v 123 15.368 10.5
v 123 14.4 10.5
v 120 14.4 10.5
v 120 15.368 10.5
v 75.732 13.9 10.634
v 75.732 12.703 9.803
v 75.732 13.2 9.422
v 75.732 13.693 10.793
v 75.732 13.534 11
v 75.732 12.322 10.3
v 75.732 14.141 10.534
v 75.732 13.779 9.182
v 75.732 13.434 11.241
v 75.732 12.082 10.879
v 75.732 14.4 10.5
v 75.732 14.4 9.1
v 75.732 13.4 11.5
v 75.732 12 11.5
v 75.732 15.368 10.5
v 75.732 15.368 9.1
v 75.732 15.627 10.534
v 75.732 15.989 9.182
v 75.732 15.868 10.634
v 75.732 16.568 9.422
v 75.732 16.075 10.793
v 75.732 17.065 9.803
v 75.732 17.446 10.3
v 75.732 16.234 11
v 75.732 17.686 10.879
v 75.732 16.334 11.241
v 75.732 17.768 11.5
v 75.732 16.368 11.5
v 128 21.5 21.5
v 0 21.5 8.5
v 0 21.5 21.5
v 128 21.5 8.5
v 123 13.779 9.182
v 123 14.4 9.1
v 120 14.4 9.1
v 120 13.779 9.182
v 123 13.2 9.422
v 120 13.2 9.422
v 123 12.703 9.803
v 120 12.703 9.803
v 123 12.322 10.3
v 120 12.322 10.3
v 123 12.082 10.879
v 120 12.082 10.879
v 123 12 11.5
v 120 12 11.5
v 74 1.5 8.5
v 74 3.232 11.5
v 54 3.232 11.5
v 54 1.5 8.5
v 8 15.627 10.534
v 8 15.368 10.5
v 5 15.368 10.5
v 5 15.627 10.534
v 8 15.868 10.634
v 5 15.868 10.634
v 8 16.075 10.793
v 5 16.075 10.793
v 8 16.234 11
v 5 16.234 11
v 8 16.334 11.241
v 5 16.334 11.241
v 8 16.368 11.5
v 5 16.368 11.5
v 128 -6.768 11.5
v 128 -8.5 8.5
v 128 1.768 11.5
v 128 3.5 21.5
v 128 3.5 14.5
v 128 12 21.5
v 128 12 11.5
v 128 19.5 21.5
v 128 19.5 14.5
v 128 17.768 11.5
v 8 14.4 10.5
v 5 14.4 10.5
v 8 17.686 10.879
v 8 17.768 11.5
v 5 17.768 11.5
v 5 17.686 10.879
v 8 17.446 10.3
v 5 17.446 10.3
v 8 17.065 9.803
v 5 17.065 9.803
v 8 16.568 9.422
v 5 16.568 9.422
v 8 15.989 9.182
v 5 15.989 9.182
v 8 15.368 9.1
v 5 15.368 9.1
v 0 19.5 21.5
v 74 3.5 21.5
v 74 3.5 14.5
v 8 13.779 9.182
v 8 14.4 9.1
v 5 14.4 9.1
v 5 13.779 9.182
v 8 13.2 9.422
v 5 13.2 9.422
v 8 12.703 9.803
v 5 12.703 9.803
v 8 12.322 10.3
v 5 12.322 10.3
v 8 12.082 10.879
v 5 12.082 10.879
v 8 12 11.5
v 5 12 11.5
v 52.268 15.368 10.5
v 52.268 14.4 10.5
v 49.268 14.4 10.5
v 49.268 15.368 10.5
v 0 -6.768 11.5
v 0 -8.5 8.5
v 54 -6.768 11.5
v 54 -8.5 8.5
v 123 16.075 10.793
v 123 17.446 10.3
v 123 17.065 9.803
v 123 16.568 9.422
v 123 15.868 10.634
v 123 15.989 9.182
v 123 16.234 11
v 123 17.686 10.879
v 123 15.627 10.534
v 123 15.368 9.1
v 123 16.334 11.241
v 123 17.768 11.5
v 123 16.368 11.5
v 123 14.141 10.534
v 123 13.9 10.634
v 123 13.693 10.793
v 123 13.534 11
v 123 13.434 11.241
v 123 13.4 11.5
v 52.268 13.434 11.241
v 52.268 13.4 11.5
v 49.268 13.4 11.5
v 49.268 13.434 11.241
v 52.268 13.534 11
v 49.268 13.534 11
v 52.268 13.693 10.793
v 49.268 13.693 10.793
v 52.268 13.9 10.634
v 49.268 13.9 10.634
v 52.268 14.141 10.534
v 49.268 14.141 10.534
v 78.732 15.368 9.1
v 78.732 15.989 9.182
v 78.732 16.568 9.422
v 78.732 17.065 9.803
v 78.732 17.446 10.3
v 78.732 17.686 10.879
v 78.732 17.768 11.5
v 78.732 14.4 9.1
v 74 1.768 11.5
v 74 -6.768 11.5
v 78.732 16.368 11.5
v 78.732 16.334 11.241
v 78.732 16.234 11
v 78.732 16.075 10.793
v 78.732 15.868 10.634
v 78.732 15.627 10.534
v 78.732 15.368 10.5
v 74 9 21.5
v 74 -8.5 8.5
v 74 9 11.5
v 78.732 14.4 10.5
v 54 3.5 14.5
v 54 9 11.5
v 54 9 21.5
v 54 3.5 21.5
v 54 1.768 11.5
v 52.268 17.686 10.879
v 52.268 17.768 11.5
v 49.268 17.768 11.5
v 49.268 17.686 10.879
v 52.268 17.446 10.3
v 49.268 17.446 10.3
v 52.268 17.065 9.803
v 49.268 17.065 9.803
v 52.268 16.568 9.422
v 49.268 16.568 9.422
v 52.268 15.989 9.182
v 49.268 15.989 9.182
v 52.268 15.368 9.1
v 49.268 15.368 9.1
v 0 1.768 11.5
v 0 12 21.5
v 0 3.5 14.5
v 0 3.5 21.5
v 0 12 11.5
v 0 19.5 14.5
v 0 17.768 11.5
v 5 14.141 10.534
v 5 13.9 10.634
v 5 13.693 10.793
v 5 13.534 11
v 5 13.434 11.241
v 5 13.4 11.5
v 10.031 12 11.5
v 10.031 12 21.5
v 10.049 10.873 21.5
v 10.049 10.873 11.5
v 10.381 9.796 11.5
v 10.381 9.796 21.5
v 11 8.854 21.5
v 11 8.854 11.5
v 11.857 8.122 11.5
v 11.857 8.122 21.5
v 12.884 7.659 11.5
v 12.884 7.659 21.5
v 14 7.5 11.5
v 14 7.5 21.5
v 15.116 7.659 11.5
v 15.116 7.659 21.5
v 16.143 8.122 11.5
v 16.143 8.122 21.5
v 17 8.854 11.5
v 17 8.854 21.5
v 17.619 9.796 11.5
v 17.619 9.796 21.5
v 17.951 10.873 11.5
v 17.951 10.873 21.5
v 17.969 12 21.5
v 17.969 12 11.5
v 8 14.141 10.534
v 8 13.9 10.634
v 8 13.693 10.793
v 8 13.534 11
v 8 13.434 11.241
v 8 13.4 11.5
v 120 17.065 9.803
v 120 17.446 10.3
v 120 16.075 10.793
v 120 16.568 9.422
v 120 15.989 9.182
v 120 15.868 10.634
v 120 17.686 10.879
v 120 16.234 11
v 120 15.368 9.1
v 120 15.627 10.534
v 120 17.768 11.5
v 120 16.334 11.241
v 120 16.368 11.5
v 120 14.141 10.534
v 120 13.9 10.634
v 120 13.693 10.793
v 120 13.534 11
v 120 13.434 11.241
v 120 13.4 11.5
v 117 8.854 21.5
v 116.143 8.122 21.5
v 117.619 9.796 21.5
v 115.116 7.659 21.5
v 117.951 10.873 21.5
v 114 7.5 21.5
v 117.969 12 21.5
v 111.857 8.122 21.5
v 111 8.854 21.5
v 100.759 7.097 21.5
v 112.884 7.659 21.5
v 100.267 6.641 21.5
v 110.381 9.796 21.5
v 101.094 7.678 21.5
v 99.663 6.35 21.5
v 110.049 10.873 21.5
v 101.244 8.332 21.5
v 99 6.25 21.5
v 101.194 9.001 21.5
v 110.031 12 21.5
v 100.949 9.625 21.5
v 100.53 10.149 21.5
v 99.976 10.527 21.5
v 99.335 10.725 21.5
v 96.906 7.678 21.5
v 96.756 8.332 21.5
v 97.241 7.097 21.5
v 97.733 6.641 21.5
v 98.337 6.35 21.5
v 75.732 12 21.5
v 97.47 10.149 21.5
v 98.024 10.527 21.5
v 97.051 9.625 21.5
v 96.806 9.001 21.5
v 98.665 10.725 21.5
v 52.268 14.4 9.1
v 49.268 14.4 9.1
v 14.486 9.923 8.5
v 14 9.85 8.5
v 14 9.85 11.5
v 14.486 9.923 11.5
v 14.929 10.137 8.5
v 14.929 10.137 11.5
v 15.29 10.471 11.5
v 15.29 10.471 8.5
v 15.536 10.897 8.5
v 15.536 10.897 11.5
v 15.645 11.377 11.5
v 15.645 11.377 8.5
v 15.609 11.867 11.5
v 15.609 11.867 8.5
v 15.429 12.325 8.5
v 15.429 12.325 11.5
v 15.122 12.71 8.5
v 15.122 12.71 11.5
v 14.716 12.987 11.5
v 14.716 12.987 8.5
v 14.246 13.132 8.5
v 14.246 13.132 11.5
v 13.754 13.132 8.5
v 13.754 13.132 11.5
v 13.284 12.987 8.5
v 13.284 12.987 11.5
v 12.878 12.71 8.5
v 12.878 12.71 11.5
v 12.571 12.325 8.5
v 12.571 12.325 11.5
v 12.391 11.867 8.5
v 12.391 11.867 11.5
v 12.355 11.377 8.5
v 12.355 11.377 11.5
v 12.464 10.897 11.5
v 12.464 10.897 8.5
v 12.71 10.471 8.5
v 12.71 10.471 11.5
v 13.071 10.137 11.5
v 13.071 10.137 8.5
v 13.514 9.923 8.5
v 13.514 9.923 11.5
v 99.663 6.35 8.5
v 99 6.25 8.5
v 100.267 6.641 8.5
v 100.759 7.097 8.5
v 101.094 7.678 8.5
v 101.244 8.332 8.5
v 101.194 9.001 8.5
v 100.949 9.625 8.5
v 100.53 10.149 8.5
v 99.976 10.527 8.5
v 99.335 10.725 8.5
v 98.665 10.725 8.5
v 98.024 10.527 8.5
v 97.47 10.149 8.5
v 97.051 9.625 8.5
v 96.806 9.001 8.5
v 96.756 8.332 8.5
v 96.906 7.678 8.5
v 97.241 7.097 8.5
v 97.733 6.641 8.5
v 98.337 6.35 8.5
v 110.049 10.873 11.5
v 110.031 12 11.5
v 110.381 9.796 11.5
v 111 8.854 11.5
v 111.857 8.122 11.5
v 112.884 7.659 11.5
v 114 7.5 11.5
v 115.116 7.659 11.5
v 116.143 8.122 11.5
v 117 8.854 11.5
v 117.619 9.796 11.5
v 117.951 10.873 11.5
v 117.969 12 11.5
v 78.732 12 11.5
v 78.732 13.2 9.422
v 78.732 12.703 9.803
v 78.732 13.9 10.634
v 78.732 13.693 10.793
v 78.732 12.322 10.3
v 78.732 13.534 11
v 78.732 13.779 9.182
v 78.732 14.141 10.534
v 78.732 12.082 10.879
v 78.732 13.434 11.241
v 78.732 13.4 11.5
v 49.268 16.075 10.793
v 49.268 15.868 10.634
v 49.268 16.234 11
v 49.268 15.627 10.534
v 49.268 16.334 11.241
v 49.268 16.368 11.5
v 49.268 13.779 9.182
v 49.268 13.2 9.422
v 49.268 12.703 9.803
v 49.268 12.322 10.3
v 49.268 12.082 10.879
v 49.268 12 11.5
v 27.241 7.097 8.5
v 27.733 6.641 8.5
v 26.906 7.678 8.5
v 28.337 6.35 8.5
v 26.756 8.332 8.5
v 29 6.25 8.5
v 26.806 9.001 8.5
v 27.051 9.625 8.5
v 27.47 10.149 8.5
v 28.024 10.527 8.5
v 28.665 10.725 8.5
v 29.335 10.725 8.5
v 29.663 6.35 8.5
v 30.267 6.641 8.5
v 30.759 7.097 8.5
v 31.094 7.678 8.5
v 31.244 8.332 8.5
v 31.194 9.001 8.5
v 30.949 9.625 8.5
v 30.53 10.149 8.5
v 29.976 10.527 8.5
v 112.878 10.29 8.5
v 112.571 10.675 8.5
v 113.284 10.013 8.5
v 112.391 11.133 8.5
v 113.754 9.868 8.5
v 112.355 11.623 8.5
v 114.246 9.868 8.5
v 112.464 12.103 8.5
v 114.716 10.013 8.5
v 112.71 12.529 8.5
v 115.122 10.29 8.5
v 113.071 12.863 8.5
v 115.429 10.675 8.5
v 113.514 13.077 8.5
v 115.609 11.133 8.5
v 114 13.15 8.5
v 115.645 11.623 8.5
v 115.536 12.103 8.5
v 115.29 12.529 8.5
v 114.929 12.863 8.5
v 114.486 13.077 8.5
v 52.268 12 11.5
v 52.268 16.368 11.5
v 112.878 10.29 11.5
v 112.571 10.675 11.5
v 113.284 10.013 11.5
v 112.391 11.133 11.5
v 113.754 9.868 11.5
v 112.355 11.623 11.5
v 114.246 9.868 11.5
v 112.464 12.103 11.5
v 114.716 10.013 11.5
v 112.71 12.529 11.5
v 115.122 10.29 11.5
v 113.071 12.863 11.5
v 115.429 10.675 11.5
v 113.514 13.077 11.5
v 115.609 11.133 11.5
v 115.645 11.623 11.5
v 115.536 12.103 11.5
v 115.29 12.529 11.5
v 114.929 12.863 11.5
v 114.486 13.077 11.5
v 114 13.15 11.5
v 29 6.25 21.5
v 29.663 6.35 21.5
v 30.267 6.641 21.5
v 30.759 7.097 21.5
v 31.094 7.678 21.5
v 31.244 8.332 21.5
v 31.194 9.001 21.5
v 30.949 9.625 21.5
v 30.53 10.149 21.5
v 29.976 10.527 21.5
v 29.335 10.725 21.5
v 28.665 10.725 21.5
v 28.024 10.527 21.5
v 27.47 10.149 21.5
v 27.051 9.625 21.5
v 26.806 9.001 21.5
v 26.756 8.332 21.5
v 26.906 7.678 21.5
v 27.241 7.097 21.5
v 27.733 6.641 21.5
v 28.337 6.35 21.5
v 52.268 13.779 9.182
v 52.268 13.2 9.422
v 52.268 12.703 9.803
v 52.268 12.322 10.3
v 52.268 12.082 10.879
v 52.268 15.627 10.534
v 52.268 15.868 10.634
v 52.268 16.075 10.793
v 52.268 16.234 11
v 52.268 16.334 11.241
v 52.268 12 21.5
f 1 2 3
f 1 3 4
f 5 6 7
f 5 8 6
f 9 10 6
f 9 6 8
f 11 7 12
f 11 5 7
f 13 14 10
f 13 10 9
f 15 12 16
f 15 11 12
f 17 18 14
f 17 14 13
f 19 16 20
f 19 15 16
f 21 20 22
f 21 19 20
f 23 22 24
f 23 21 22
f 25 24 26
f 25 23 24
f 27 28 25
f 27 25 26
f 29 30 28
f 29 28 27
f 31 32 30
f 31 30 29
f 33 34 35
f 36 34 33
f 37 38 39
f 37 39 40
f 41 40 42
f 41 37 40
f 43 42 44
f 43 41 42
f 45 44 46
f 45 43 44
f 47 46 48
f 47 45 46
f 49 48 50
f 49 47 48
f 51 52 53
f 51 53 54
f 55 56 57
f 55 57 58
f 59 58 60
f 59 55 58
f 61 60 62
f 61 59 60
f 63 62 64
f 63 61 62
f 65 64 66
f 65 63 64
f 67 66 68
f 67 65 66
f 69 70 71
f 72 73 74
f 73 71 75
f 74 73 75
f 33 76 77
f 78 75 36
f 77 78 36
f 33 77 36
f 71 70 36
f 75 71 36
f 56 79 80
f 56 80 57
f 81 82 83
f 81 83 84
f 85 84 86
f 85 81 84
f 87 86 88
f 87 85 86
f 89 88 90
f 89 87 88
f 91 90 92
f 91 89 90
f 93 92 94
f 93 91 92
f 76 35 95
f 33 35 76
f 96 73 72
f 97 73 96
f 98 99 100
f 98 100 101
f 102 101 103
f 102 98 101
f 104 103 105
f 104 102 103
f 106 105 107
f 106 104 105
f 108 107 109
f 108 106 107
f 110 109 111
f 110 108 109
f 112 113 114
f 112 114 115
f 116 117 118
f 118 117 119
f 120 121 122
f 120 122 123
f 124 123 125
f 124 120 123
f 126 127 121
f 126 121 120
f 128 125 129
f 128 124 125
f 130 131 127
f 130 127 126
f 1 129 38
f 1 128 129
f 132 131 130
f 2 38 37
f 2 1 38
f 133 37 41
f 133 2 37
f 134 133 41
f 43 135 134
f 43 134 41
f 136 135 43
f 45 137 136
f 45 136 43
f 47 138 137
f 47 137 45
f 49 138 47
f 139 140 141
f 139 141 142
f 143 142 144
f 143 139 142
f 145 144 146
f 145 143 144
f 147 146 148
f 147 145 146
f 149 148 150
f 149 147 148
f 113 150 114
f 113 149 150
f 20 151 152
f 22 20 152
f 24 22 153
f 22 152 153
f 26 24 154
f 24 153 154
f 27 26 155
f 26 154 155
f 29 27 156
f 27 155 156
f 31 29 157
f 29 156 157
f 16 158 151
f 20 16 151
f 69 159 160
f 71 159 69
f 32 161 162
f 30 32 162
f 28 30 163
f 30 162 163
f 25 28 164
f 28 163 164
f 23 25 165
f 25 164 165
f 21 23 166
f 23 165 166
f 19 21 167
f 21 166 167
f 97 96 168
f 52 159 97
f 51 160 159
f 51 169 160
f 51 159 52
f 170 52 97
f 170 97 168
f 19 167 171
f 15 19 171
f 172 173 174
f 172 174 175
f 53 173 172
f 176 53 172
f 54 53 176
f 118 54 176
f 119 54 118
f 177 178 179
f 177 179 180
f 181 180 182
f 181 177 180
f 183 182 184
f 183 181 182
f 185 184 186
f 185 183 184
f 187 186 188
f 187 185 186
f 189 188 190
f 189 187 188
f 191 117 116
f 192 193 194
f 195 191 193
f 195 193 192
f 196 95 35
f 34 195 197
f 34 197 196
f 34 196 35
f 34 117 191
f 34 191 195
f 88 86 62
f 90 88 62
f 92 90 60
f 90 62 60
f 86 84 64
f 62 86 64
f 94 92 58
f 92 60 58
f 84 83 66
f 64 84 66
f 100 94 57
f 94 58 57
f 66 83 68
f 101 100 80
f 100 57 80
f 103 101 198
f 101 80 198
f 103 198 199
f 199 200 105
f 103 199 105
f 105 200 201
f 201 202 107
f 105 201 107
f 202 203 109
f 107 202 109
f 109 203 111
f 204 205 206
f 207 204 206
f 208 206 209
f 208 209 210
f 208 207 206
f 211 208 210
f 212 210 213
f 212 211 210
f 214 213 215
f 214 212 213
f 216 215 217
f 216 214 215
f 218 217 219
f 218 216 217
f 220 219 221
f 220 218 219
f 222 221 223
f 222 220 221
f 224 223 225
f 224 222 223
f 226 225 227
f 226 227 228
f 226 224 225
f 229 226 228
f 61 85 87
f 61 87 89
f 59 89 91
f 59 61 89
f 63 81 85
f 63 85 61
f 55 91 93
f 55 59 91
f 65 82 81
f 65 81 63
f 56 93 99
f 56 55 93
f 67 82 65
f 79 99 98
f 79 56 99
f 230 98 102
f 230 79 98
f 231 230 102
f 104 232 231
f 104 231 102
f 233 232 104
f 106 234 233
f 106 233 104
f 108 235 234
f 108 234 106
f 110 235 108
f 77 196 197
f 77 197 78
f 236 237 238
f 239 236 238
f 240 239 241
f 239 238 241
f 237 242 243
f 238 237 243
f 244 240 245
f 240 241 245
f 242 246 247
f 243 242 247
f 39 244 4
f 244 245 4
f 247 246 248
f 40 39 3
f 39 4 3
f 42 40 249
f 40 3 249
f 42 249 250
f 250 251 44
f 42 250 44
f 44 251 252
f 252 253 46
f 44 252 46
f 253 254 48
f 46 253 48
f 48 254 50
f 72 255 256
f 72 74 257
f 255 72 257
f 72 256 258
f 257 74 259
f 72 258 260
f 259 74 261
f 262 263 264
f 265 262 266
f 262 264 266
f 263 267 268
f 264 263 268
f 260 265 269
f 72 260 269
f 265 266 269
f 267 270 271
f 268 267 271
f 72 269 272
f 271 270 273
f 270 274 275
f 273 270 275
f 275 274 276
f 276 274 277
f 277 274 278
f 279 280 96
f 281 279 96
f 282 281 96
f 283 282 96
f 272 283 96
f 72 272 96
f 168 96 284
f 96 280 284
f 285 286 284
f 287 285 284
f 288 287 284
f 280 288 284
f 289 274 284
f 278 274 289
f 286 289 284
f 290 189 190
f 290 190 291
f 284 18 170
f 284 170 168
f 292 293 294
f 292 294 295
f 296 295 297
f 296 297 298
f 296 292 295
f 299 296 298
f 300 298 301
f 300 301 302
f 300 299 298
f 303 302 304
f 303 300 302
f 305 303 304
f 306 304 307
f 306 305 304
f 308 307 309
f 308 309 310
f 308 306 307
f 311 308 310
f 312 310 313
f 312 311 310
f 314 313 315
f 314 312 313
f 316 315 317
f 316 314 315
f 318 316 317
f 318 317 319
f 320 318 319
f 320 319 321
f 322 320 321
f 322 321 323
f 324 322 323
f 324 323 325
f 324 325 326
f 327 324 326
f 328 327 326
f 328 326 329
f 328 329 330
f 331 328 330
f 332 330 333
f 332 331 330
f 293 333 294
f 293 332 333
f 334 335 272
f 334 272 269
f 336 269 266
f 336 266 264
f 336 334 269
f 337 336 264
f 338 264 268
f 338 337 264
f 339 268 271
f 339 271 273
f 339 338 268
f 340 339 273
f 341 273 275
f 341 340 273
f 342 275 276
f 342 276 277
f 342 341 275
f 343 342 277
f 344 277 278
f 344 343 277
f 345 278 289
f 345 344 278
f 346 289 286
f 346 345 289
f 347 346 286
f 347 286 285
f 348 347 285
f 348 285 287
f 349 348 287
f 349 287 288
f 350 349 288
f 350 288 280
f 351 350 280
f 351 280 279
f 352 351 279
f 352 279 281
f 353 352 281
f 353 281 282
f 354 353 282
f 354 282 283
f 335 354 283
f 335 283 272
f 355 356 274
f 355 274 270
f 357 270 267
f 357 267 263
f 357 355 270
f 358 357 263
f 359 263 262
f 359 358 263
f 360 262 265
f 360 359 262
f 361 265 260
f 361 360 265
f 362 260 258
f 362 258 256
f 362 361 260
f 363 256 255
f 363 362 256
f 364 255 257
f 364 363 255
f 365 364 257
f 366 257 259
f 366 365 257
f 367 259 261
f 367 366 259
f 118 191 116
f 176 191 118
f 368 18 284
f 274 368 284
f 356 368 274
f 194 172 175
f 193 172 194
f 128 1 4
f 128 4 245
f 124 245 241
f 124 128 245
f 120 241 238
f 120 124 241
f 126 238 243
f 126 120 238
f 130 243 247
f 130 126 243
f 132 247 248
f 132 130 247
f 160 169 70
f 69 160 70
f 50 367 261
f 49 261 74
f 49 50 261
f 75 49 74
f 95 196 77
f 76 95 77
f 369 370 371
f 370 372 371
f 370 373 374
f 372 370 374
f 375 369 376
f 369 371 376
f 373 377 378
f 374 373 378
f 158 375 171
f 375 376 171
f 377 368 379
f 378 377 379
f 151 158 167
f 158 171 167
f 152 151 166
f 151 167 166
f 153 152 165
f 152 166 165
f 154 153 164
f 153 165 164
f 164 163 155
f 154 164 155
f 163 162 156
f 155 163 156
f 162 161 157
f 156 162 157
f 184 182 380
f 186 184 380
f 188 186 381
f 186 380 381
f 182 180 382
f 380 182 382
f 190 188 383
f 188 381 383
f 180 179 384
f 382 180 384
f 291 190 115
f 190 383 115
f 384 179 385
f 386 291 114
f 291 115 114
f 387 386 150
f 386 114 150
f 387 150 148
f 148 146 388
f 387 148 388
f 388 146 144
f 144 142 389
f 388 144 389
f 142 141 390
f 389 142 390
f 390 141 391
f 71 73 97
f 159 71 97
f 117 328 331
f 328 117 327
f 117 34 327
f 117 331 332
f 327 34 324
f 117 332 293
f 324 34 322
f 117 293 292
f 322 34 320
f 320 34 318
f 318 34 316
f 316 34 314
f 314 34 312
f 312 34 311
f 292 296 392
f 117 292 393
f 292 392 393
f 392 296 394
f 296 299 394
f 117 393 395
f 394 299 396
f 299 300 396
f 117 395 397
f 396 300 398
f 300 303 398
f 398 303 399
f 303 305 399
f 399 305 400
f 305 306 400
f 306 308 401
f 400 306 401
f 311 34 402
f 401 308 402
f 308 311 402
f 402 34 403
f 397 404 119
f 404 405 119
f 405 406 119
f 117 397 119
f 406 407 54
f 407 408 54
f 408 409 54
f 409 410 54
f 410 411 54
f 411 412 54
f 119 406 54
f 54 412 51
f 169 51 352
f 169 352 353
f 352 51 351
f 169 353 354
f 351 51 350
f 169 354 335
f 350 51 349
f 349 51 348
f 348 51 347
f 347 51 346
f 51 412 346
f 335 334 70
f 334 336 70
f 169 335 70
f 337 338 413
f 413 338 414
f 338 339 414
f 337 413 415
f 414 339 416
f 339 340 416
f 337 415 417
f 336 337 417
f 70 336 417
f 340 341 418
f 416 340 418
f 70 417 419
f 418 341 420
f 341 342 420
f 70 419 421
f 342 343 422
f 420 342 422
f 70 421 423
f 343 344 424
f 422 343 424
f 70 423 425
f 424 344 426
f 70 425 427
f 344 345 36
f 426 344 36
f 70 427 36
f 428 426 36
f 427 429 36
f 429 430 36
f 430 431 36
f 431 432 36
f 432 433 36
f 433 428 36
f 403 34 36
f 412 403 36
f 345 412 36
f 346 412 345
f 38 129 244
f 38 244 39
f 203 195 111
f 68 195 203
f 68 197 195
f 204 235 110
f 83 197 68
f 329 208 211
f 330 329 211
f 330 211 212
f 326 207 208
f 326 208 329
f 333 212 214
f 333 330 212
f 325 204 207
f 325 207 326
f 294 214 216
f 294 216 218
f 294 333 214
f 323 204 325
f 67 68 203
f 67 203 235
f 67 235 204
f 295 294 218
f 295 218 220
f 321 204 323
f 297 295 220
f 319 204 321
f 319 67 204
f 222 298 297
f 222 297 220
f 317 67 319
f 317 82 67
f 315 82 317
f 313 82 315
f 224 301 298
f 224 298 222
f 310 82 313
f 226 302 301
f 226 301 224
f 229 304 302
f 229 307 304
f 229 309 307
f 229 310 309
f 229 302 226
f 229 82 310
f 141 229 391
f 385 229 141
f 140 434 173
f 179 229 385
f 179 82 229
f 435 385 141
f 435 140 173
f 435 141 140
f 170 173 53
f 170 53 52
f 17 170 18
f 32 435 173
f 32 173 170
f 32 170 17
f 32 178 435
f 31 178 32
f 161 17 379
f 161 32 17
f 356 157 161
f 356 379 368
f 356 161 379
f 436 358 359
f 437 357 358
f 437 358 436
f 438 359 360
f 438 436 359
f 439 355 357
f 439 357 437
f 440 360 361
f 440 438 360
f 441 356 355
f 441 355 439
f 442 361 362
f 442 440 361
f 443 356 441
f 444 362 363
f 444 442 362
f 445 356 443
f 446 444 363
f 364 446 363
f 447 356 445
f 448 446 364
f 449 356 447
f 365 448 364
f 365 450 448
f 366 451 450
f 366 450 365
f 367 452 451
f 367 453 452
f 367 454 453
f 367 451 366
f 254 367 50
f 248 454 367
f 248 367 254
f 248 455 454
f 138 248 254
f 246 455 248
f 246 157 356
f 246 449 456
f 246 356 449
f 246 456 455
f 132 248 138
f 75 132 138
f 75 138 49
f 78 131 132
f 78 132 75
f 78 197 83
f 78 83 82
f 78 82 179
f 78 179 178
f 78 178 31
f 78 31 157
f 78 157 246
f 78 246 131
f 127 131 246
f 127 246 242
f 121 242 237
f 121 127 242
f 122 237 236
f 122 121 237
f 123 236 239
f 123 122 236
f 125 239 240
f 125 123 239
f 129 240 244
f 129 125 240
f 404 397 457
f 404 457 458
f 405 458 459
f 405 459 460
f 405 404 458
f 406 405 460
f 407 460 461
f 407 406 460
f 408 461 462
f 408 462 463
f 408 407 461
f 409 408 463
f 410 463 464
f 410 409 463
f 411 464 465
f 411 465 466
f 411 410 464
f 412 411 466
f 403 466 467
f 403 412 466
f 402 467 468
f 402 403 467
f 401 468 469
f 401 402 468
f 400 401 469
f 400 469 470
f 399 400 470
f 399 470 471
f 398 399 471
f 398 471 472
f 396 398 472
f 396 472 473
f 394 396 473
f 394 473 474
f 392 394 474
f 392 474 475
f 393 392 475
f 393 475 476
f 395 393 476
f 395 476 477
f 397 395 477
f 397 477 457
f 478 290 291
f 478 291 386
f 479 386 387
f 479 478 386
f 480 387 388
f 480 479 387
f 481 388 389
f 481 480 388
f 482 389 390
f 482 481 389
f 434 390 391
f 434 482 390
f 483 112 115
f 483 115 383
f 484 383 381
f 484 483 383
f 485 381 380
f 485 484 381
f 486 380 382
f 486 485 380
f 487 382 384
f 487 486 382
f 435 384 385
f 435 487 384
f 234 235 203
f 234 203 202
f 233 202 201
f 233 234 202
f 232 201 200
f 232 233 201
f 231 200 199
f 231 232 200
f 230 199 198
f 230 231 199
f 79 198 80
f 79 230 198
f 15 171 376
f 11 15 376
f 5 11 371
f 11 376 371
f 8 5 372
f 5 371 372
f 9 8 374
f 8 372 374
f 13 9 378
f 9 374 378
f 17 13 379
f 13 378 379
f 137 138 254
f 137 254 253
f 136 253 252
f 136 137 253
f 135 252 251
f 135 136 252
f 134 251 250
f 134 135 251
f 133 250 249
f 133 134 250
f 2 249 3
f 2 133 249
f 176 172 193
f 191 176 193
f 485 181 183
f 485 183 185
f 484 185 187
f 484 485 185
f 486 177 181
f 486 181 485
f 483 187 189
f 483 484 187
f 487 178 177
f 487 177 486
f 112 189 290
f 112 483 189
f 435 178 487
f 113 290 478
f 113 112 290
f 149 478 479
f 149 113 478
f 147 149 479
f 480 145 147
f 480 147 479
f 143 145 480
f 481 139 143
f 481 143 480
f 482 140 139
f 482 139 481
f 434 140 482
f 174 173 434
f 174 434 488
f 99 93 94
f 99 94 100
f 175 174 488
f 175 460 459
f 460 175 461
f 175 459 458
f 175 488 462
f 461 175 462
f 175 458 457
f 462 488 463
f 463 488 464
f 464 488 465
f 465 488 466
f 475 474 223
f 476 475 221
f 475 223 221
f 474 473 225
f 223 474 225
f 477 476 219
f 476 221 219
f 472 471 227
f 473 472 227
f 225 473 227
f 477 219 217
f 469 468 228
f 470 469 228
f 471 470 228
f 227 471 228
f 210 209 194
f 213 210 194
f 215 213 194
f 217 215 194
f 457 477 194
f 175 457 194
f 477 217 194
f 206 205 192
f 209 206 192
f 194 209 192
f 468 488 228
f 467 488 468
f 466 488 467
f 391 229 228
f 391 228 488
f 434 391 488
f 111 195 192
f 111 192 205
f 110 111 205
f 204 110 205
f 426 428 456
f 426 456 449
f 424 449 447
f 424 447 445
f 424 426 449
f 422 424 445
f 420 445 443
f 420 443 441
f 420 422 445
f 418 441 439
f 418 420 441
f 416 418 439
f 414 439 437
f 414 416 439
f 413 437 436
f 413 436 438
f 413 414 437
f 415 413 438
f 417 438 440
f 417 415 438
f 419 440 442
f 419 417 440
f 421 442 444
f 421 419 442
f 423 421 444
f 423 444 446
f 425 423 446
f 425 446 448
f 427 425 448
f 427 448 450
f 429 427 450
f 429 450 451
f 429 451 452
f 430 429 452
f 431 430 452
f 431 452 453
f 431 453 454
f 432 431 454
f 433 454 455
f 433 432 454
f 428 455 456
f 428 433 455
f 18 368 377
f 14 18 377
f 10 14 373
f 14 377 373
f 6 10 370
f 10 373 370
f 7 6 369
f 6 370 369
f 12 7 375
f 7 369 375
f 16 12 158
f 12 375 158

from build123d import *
from OCP.BRepFilletAPI import BRepFilletAPI_MakeChamfer

# Parameters (mm, degrees)
SKIZZE1_R                          = 1.65
SKIZZE1_R_2                        = 2.25
AUFSATZ_LINEAR_AUSTRAGEN1_DEPTH    = 3
SKIZZE2_W                          = 128
SKIZZE2_H                          = 2
SKIZZE2_R                          = 2.25
AUFSATZ_LINEAR_AUSTRAGEN2_DEPTH    = 10
FASE1_SIZE                         = 1.732050808
FASE1_SIZE_2                       = 3
FASE2_SIZE                         = 1.732050808
FASE2_SIZE_2                       = 3
SCHNITT_LINEAR_START               = -5
SCHNITT_LINEAR_AUSTRAGEN1_DEPTH    = 3
SCHNITT_LINEAR_START_2             = -41.26795
SCHNITT_LINEAR_AUSTRAGEN2_DEPTH    = 3
SCHNITT_LINEAR_START_3             = -8
SCHNITT_LINEAR_AUSTRAGEN3_DEPTH    = 3
SCHNITT_LINEAR_START_4             = -44.26795
SCHNITT_LINEAR_AUSTRAGEN4_DEPTH    = 3
K_RPER_VERSCHIEBEN_KOPIEREN1_ANGLE = 90


# Some blends are built 0.0001 mm under size
with BuildPart() as part:
    # Skizze1 → Aufsatz-Linear austragen1 (new body)
    with BuildSketch(Plane(origin=(0, 0, 0), x_dir=(1, 0, 0), z_dir=(0, 1, 0))):
        Polygon((54, -20), (74, -20), (74, -30), (128, -30), (128, 0), (0, 0), (0, -30), (54, -30), align=None)
        with Locations(Location((114, -10, 0), (0, 0, 90))):
            Circle(SKIZZE1_R, mode=Mode.SUBTRACT)
        with Locations(Location((14, -10, 0), (0, 0, 270))):
            Circle(SKIZZE1_R, mode=Mode.SUBTRACT)
        with Locations(Location((29, -13, 0), (0, 0, 270))):
            Circle(SKIZZE1_R_2, mode=Mode.SUBTRACT)
        with Locations(Location((99, -13, 0), (0, 0, 270))):
            Circle(SKIZZE1_R_2, mode=Mode.SUBTRACT)
    extrude(amount=AUFSATZ_LINEAR_AUSTRAGEN1_DEPTH)

    # Skizze2 → Aufsatz-Linear austragen2 (add)
    # profile 1 of 3: a face of its own
    with BuildSketch(Plane(origin=(0, 3, 0), x_dir=(1, 0, 0), z_dir=(0, 1, 0))):
        with Locations((64, -1)):
            Rectangle(SKIZZE2_W, SKIZZE2_H)
    # profile 2 of 3: a face of its own
    with BuildSketch(Plane(origin=(0, 3, 0), x_dir=(1, 0, 0), z_dir=(0, 1, 0))):
        with BuildLine():
            Line((0, -9.5), (10.031373033, -9.5))
            ThreePointArc((10.031373033, -9.5), (14, -14), (17.968626967, -9.5))
            Line((17.968626967, -9.5), (54, -9.5))
            Line((54, -9.5), (54, -18))
            Line((54, -18), (0, -18))
            Line((0, -18), (0, -9.5))
        make_face()
        with Locations(Location((29, -13, 0), (0, 0, 270))):
            Circle(SKIZZE2_R, mode=Mode.SUBTRACT)
    # profile 3 of 3: a face of its own
    with BuildSketch(Plane(origin=(0, 3, 0), x_dir=(1, 0, 0), z_dir=(0, 1, 0))):
        with BuildLine():
            Line((128, -9.5), (128, -18))
            Line((128, -18), (74, -18))
            Line((74, -18), (74, -9.5))
            Line((74, -9.5), (110.031373033, -9.5))
            ThreePointArc((110.031373033, -9.5), (114, -14), (117.968626967, -9.5))
            Line((117.968626967, -9.5), (128, -9.5))
        make_face()
        with Locations(Location((99, -13, 0), (0, 0, 270))):
            Circle(SKIZZE2_R, mode=Mode.SUBTRACT)
    extrude(amount=AUFSATZ_LINEAR_AUSTRAGEN2_DEPTH)

    # Fase1
    fase1_edges_1 = [part.edges().sort_by_distance(p)[0] for p in [
        (54, 8, 9.5),
    ]]
    fase1_side_1 = [part.faces().sort_by_distance(p)[0] for p in [
        (53.965358984, 8, 9.5),
    ]]
    fase1_edges_2 = [part.edges().sort_by_distance(p)[0] for p in [
        (74, 8, 9.5),
    ]]
    fase1_side_2 = [part.faces().sort_by_distance(p)[0] for p in [
        (74, 8, 9.534641016),
    ]]
    fase1_edges_3 = [part.edges().sort_by_distance(p)[0] for p in [
        (64, 3, 2),
    ]]
    fase1_side_3 = [part.faces().sort_by_distance(p)[0] for p in [
        (64, 3, 2.034641016),
    ]]
    fase1_edges_4 = [part.edges().sort_by_distance(p)[0] for p in [
        (27, 3, 18),
    ]]
    fase1_side_4 = [part.faces().sort_by_distance(p)[0] for p in [
        (27, 3, 18.034641016),
    ]]
    fase1_edges_5 = [part.edges().sort_by_distance(p)[0] for p in [
        (101, 3, 18),
    ]]
    fase1_side_5 = [part.faces().sort_by_distance(p)[0] for p in [
        (101, 3, 18.034641016),
    ]]
    fase1_edges_6 = [part.edges().sort_by_distance(p)[0] for p in [
        (27, 3, 30),
    ]]
    fase1_side_6 = [part.faces().sort_by_distance(p)[0] for p in [
        (27, 3, 29.965358984),
    ]]
    fase1_edges_7 = [part.edges().sort_by_distance(p)[0] for p in [
        (101, 3, 30),
    ]]
    fase1_side_7 = [part.faces().sort_by_distance(p)[0] for p in [
        (101, 3, 29.965358984),
    ]]
    fase1 = BRepFilletAPI_MakeChamfer(part.part.solid().wrapped)
    for e in fase1_edges_1:
        fase1.Add(FASE1_SIZE - 0.0001, FASE1_SIZE_2 - 0.0001, e.wrapped, fase1_side_1[0].wrapped)
    for e in fase1_edges_2:
        fase1.Add(FASE1_SIZE_2 - 0.0001, FASE1_SIZE - 0.0001, e.wrapped, fase1_side_2[0].wrapped)
    for e in fase1_edges_3:
        fase1.Add(FASE1_SIZE - 0.0001, FASE1_SIZE_2 - 0.0001, e.wrapped, fase1_side_3[0].wrapped)
    for e in fase1_edges_4:
        fase1.Add(FASE1_SIZE - 0.0001, FASE1_SIZE_2 - 0.0001, e.wrapped, fase1_side_4[0].wrapped)
    for e in fase1_edges_5:
        fase1.Add(FASE1_SIZE - 0.0001, FASE1_SIZE_2 - 0.0001, e.wrapped, fase1_side_5[0].wrapped)
    for e in fase1_edges_6:
        fase1.Add(FASE1_SIZE - 0.0001, FASE1_SIZE_2 - 0.0001, e.wrapped, fase1_side_6[0].wrapped)
    for e in fase1_edges_7:
        fase1.Add(FASE1_SIZE - 0.0001, FASE1_SIZE_2 - 0.0001, e.wrapped, fase1_side_7[0].wrapped)
    add(Compound.cast(fase1.Shape()), mode=Mode.REPLACE)  # a hair under: the kernel refuses the full size

    # Fase2
    # the kernel refuses this chamfer: 3, 1.732050808 mm, written as the material it takes off along each edge
    with BuildSketch(Plane(origin=(54, 3, 20), x_dir=(0, 0.057893862402670915, -0.9983227437537925), z_dir=(1, 0, 0))) as fase2_piece_1:
        Polygon((FASE2_SIZE * 0.998322743505, -FASE2_SIZE * 0.0578938623883), (-FASE2_SIZE_2 * 0.0578938624027, -FASE2_SIZE_2 * 0.998322743754), (0, 0), align=None)
    extrude(amount=20, mode=Mode.SUBTRACT)

    # Skizze3 → Schnitt-Linear austragen1 (cut)
    with BuildSketch(Plane(origin=(128, 0, 0), x_dir=(0, 0, -1), z_dir=(1, 0, 0)).offset(SCHNITT_LINEAR_START)):
        with BuildLine():
            Line((-9.5, 3), (-8.1, 3))
            ThreePointArc((-8.1, 3), (-7.807106781, 2.292893219), (-7.1, 2))
            Line((-7.1, 2), (-6.132050808, 2))
            ThreePointArc((-6.132050808, 2), (-5.424944026, 2.292893219), (-5.132050808, 3))
            Line((-5.132050808, 3), (-3.732050808, 3))
            ThreePointArc((-3.732050808, 3), (-4.434994533, 1.302943725), (-6.132050808, 0.6))
            Line((-6.132050808, 0.6), (-7.1, 0.6))
            ThreePointArc((-7.1, 0.6), (-8.797056275, 1.302943725), (-9.5, 3))
        make_face()
    extrude(amount=-SCHNITT_LINEAR_AUSTRAGEN1_DEPTH, mode=Mode.SUBTRACT)

    # Skizze4 → Schnitt-Linear austragen2 (cut)
    with BuildSketch(Plane(origin=(120, 0, 0), x_dir=(0, 0, -1), z_dir=(1, 0, 0)).offset(SCHNITT_LINEAR_START_2)):
        with BuildLine():
            Line((-7.1, 0.6), (-6.132050808, 0.6))
            ThreePointArc((-6.132050808, 0.6), (-4.434994533, 1.302943725), (-3.732050808, 3))
            Line((-3.732050808, 3), (-5.132050808, 3))
            ThreePointArc((-5.132050808, 3), (-5.424944026, 2.292893219), (-6.132050808, 2))
            Line((-6.132050808, 2), (-7.1, 2))
            ThreePointArc((-7.1, 2), (-7.807106781, 2.292893219), (-8.1, 3))
            Line((-8.1, 3), (-9.5, 3))
            ThreePointArc((-9.5, 3), (-8.797056275, 1.302943725), (-7.1, 0.6))
        make_face()
    extrude(amount=-SCHNITT_LINEAR_AUSTRAGEN2_DEPTH, mode=Mode.SUBTRACT)

    # Skizze5 → Schnitt-Linear austragen3 (cut)
    with BuildSketch(Plane.ZY.offset(SCHNITT_LINEAR_START_3)):
        with BuildLine():
            Line((9.5, 3), (8.1, 3))
            ThreePointArc((8.1, 3), (7.807106781, 2.292893219), (7.1, 2))
            Line((7.1, 2), (6.132050808, 2))
            ThreePointArc((6.132050808, 2), (5.424944026, 2.292893219), (5.132050808, 3))
            Line((5.132050808, 3), (3.732050808, 3))
            ThreePointArc((3.732050808, 3), (4.434994533, 1.302943725), (6.132050808, 0.6))
            Line((6.132050808, 0.6), (7.1, 0.6))
            ThreePointArc((7.1, 0.6), (8.797056275, 1.302943725), (9.5, 3))
        make_face()
    extrude(amount=SCHNITT_LINEAR_AUSTRAGEN3_DEPTH, mode=Mode.SUBTRACT)

    # Skizze6 → Schnitt-Linear austragen4 (cut)
    with BuildSketch(Plane.ZY.offset(-8).offset(SCHNITT_LINEAR_START_4)):
        with BuildLine():
            Line((9.5, 3), (8.1, 3))
            ThreePointArc((8.1, 3), (7.807106781, 2.292893219), (7.1, 2))
            Line((7.1, 2), (6.132050808, 2))
            ThreePointArc((6.132050808, 2), (5.424944026, 2.292893219), (5.132050808, 3))
            Line((5.132050808, 3), (3.732050808, 3))
            ThreePointArc((3.732050808, 3), (4.434994533, 1.302943725), (6.132050808, 0.6))
            Line((6.132050808, 0.6), (7.1, 0.6))
            ThreePointArc((7.1, 0.6), (8.797056275, 1.302943725), (9.5, 3))
        make_face()
    extrude(amount=SCHNITT_LINEAR_AUSTRAGEN4_DEPTH, mode=Mode.SUBTRACT)


with BuildPart() as part_1:
    # Körper-Verschieben/Kopieren1: moved
    add(part.part.rotate(Axis((0, 6.5, 15), (1, 0, 0)), K_RPER_VERSCHIEBEN_KOPIEREN1_ANGLE))


solid = part_1.part
